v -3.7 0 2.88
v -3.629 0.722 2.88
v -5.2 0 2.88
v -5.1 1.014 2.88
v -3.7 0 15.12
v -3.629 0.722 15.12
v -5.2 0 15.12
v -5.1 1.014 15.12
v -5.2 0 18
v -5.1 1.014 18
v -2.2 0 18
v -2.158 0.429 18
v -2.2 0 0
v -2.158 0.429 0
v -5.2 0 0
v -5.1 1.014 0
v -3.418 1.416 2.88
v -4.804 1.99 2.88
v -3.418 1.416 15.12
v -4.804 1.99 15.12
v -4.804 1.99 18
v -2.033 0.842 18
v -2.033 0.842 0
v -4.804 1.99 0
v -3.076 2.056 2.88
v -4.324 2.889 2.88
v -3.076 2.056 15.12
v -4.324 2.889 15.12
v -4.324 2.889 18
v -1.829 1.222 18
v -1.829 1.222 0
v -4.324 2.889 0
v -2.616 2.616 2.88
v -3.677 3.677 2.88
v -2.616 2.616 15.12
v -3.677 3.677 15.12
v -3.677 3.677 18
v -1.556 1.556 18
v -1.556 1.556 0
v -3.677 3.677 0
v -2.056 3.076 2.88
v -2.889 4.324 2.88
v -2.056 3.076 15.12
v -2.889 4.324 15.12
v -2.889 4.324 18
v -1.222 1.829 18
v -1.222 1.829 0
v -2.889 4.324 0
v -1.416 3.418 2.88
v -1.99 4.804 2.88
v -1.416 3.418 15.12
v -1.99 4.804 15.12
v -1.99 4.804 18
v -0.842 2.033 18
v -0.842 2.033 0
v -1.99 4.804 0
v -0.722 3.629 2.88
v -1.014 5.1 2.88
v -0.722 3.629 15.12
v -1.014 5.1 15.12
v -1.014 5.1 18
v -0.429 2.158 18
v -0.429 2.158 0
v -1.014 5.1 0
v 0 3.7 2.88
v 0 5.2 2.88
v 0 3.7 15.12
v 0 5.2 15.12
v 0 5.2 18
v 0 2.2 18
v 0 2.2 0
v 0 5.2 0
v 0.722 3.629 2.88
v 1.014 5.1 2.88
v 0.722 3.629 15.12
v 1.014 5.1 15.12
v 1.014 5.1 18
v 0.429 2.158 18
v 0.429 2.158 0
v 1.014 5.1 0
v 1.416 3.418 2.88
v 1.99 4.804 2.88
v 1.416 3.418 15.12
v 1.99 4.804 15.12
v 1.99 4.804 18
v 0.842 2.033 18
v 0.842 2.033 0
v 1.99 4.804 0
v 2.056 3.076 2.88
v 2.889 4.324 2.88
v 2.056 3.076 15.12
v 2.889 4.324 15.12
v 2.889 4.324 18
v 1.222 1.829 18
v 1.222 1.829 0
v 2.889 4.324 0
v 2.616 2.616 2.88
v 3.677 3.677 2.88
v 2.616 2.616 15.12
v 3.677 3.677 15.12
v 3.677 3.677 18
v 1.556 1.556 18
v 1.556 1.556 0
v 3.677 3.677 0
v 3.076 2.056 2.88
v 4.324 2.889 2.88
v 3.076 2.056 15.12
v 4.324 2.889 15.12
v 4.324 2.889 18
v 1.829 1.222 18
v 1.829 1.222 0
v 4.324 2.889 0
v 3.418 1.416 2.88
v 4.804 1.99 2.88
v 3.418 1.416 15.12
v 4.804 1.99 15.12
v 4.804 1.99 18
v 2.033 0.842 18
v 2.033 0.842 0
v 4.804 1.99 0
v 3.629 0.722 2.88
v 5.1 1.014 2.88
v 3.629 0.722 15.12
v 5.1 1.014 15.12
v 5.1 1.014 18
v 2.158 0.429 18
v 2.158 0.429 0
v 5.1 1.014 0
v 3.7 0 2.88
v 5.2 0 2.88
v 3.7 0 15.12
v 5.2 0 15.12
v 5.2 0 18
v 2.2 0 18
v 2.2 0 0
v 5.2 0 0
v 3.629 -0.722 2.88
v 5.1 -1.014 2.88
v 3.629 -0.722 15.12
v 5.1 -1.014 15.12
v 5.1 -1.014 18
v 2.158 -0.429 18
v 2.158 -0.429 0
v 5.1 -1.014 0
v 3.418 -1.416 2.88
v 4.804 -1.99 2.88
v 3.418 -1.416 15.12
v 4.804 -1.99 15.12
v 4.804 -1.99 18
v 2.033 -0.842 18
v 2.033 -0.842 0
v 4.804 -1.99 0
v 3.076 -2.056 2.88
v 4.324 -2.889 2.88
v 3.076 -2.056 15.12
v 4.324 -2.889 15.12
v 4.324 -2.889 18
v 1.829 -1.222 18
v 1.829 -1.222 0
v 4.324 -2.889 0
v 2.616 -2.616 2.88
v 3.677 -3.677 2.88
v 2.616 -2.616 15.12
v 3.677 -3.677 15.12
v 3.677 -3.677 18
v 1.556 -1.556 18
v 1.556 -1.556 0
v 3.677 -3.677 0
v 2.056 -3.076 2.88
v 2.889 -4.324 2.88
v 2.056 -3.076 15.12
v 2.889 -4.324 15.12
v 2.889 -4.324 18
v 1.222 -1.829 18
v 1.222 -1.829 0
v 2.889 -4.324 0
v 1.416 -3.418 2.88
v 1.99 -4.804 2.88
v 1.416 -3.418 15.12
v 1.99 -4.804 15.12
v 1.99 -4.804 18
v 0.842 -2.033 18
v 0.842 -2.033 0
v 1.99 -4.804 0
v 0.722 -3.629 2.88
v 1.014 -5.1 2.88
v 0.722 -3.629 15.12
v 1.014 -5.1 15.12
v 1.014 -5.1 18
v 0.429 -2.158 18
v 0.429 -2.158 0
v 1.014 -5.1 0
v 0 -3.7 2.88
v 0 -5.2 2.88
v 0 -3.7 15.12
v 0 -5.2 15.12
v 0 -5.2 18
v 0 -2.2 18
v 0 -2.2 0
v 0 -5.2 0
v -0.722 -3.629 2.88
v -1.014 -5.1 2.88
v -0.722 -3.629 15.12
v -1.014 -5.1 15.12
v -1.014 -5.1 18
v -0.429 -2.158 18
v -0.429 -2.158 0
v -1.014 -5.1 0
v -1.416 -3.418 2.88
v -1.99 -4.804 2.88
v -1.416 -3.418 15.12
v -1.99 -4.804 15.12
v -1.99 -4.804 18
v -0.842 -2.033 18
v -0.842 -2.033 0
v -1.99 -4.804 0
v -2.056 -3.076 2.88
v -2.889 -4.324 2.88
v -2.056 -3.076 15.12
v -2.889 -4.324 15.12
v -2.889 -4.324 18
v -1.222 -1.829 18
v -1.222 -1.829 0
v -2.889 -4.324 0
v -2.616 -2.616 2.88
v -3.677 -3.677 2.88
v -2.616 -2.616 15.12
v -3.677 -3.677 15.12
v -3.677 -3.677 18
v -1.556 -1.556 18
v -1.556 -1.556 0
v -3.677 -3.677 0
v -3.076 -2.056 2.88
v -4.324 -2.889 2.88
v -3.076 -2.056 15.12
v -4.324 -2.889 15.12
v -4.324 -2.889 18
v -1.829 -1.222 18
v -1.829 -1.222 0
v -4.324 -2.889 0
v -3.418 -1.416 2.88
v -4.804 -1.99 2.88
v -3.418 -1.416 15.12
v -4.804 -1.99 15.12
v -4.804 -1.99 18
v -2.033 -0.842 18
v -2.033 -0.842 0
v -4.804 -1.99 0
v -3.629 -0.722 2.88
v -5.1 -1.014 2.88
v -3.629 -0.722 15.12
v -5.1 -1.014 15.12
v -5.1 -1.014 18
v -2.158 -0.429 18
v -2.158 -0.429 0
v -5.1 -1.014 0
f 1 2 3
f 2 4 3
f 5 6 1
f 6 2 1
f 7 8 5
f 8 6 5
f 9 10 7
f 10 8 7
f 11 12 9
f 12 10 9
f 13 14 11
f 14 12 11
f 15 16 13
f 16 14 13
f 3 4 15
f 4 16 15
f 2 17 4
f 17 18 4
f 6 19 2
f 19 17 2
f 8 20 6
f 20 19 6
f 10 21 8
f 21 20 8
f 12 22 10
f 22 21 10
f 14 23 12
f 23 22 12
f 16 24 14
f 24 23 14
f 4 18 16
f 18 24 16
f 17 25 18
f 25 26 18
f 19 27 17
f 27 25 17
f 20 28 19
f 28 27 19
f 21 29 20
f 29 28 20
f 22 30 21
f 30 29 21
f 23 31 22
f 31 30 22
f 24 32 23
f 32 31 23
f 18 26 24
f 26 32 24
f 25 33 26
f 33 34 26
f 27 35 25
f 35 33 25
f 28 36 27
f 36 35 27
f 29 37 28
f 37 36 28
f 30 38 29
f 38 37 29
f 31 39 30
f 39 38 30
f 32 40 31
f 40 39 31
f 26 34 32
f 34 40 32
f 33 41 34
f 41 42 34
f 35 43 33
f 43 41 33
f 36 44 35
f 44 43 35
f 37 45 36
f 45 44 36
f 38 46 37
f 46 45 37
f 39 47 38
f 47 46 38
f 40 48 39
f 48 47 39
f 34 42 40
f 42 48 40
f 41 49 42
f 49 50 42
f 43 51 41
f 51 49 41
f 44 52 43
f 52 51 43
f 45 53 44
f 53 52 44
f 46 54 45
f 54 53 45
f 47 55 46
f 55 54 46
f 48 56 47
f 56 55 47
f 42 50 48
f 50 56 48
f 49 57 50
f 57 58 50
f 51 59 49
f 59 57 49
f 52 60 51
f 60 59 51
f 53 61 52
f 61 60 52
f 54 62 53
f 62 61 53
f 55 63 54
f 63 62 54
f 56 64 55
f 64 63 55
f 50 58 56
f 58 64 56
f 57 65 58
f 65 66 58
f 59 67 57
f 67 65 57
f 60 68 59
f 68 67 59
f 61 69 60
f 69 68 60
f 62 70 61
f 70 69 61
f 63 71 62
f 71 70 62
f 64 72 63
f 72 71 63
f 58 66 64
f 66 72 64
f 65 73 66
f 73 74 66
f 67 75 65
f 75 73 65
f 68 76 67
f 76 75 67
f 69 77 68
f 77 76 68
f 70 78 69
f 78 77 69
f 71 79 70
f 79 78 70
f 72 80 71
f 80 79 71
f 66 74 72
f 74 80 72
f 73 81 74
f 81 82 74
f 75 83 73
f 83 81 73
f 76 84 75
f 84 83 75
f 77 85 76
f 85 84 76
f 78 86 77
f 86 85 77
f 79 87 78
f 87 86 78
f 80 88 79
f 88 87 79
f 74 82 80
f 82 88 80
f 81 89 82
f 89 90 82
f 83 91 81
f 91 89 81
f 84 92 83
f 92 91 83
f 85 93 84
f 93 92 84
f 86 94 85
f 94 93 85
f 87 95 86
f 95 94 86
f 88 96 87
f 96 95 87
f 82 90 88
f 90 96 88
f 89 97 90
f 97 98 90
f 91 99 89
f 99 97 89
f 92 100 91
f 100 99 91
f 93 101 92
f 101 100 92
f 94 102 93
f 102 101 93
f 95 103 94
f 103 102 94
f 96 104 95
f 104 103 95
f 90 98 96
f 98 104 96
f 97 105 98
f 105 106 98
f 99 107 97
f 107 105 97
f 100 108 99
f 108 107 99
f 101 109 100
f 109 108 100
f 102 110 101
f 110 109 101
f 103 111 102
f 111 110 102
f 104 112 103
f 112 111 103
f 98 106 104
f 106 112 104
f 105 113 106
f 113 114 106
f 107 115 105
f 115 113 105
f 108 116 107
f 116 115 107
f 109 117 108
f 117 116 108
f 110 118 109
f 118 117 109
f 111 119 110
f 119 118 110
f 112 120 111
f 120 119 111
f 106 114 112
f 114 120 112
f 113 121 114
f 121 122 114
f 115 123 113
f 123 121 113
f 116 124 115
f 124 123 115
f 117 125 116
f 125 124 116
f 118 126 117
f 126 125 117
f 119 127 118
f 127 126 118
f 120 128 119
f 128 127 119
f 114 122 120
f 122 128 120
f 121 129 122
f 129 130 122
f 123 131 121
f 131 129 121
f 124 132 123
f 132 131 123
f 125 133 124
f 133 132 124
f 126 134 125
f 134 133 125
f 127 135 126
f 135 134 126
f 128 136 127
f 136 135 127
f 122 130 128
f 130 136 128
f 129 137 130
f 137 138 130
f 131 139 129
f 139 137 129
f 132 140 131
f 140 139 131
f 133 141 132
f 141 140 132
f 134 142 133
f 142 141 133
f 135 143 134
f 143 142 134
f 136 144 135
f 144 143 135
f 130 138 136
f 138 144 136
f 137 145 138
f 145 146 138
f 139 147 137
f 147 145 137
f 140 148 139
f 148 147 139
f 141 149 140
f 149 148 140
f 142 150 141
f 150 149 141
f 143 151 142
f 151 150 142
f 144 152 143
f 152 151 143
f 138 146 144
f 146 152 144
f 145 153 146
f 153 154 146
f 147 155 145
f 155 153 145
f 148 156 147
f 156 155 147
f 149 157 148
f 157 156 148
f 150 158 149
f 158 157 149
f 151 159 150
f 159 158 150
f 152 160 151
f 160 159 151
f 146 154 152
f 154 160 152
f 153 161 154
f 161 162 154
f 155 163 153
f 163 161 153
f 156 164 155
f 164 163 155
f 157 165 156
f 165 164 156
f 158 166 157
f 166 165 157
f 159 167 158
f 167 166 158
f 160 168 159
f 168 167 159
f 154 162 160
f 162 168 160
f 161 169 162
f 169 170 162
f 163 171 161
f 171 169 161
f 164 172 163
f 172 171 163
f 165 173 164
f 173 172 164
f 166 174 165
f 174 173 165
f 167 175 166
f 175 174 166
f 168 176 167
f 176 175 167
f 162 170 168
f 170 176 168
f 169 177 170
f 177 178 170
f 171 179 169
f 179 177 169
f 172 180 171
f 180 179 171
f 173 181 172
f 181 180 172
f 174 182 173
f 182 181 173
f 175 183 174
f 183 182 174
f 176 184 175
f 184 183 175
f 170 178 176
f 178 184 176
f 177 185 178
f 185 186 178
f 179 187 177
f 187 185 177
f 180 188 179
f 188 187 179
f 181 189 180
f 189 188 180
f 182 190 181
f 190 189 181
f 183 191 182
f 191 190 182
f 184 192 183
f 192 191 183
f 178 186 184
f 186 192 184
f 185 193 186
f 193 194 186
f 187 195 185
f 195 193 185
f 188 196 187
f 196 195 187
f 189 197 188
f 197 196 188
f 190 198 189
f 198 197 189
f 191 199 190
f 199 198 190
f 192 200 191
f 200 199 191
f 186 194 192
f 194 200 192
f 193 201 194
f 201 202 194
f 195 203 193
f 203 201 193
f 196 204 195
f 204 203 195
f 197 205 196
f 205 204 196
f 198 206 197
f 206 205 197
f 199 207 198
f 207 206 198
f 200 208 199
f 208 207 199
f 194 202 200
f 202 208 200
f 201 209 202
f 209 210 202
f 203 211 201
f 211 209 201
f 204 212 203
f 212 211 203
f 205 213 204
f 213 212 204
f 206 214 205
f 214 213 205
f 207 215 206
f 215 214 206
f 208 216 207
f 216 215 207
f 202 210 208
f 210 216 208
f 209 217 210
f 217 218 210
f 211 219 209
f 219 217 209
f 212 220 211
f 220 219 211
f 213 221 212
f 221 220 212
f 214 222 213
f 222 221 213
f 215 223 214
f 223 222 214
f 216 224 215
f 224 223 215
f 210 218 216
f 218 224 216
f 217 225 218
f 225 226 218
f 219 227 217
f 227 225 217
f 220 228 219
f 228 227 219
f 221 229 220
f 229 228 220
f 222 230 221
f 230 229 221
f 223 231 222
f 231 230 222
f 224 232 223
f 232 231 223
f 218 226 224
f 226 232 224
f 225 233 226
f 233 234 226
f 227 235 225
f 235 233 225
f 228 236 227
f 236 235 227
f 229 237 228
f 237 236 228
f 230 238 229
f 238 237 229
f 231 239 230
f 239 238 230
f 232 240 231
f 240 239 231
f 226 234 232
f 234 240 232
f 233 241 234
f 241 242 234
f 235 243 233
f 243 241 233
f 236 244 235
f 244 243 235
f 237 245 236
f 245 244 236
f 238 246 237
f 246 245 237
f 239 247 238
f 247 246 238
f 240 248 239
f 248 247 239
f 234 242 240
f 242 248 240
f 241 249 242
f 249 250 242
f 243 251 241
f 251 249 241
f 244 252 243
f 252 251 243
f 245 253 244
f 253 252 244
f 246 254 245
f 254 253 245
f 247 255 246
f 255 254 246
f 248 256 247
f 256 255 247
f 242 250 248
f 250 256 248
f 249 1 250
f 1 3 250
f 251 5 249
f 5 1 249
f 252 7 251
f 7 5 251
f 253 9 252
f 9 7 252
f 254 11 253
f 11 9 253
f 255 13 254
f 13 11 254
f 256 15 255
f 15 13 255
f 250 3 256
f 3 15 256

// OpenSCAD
$fn = 32;

// ----------------------------------------------------------------------
// Profiled standoff: spool spacer, 18 mm long, bore 4.4 mm
// ----------------------------------------------------------------------

// --- parameters (mm) ---
revolve_angle = 360;      // full turn around the Z axis
profile_points = 8;       // points of the closed outline

profile = [[2.2, 0], [5.2, 0], [5.2, 2.88], [3.7, 2.88], [3.7, 15.12], [5.2, 15.12], [5.2, 18], [2.2, 18]];  // single closed polygon, 8 points, counter clockwise

// --- the one profile operation ---
rotate_extrude(angle = revolve_angle) polygon(points = profile);
